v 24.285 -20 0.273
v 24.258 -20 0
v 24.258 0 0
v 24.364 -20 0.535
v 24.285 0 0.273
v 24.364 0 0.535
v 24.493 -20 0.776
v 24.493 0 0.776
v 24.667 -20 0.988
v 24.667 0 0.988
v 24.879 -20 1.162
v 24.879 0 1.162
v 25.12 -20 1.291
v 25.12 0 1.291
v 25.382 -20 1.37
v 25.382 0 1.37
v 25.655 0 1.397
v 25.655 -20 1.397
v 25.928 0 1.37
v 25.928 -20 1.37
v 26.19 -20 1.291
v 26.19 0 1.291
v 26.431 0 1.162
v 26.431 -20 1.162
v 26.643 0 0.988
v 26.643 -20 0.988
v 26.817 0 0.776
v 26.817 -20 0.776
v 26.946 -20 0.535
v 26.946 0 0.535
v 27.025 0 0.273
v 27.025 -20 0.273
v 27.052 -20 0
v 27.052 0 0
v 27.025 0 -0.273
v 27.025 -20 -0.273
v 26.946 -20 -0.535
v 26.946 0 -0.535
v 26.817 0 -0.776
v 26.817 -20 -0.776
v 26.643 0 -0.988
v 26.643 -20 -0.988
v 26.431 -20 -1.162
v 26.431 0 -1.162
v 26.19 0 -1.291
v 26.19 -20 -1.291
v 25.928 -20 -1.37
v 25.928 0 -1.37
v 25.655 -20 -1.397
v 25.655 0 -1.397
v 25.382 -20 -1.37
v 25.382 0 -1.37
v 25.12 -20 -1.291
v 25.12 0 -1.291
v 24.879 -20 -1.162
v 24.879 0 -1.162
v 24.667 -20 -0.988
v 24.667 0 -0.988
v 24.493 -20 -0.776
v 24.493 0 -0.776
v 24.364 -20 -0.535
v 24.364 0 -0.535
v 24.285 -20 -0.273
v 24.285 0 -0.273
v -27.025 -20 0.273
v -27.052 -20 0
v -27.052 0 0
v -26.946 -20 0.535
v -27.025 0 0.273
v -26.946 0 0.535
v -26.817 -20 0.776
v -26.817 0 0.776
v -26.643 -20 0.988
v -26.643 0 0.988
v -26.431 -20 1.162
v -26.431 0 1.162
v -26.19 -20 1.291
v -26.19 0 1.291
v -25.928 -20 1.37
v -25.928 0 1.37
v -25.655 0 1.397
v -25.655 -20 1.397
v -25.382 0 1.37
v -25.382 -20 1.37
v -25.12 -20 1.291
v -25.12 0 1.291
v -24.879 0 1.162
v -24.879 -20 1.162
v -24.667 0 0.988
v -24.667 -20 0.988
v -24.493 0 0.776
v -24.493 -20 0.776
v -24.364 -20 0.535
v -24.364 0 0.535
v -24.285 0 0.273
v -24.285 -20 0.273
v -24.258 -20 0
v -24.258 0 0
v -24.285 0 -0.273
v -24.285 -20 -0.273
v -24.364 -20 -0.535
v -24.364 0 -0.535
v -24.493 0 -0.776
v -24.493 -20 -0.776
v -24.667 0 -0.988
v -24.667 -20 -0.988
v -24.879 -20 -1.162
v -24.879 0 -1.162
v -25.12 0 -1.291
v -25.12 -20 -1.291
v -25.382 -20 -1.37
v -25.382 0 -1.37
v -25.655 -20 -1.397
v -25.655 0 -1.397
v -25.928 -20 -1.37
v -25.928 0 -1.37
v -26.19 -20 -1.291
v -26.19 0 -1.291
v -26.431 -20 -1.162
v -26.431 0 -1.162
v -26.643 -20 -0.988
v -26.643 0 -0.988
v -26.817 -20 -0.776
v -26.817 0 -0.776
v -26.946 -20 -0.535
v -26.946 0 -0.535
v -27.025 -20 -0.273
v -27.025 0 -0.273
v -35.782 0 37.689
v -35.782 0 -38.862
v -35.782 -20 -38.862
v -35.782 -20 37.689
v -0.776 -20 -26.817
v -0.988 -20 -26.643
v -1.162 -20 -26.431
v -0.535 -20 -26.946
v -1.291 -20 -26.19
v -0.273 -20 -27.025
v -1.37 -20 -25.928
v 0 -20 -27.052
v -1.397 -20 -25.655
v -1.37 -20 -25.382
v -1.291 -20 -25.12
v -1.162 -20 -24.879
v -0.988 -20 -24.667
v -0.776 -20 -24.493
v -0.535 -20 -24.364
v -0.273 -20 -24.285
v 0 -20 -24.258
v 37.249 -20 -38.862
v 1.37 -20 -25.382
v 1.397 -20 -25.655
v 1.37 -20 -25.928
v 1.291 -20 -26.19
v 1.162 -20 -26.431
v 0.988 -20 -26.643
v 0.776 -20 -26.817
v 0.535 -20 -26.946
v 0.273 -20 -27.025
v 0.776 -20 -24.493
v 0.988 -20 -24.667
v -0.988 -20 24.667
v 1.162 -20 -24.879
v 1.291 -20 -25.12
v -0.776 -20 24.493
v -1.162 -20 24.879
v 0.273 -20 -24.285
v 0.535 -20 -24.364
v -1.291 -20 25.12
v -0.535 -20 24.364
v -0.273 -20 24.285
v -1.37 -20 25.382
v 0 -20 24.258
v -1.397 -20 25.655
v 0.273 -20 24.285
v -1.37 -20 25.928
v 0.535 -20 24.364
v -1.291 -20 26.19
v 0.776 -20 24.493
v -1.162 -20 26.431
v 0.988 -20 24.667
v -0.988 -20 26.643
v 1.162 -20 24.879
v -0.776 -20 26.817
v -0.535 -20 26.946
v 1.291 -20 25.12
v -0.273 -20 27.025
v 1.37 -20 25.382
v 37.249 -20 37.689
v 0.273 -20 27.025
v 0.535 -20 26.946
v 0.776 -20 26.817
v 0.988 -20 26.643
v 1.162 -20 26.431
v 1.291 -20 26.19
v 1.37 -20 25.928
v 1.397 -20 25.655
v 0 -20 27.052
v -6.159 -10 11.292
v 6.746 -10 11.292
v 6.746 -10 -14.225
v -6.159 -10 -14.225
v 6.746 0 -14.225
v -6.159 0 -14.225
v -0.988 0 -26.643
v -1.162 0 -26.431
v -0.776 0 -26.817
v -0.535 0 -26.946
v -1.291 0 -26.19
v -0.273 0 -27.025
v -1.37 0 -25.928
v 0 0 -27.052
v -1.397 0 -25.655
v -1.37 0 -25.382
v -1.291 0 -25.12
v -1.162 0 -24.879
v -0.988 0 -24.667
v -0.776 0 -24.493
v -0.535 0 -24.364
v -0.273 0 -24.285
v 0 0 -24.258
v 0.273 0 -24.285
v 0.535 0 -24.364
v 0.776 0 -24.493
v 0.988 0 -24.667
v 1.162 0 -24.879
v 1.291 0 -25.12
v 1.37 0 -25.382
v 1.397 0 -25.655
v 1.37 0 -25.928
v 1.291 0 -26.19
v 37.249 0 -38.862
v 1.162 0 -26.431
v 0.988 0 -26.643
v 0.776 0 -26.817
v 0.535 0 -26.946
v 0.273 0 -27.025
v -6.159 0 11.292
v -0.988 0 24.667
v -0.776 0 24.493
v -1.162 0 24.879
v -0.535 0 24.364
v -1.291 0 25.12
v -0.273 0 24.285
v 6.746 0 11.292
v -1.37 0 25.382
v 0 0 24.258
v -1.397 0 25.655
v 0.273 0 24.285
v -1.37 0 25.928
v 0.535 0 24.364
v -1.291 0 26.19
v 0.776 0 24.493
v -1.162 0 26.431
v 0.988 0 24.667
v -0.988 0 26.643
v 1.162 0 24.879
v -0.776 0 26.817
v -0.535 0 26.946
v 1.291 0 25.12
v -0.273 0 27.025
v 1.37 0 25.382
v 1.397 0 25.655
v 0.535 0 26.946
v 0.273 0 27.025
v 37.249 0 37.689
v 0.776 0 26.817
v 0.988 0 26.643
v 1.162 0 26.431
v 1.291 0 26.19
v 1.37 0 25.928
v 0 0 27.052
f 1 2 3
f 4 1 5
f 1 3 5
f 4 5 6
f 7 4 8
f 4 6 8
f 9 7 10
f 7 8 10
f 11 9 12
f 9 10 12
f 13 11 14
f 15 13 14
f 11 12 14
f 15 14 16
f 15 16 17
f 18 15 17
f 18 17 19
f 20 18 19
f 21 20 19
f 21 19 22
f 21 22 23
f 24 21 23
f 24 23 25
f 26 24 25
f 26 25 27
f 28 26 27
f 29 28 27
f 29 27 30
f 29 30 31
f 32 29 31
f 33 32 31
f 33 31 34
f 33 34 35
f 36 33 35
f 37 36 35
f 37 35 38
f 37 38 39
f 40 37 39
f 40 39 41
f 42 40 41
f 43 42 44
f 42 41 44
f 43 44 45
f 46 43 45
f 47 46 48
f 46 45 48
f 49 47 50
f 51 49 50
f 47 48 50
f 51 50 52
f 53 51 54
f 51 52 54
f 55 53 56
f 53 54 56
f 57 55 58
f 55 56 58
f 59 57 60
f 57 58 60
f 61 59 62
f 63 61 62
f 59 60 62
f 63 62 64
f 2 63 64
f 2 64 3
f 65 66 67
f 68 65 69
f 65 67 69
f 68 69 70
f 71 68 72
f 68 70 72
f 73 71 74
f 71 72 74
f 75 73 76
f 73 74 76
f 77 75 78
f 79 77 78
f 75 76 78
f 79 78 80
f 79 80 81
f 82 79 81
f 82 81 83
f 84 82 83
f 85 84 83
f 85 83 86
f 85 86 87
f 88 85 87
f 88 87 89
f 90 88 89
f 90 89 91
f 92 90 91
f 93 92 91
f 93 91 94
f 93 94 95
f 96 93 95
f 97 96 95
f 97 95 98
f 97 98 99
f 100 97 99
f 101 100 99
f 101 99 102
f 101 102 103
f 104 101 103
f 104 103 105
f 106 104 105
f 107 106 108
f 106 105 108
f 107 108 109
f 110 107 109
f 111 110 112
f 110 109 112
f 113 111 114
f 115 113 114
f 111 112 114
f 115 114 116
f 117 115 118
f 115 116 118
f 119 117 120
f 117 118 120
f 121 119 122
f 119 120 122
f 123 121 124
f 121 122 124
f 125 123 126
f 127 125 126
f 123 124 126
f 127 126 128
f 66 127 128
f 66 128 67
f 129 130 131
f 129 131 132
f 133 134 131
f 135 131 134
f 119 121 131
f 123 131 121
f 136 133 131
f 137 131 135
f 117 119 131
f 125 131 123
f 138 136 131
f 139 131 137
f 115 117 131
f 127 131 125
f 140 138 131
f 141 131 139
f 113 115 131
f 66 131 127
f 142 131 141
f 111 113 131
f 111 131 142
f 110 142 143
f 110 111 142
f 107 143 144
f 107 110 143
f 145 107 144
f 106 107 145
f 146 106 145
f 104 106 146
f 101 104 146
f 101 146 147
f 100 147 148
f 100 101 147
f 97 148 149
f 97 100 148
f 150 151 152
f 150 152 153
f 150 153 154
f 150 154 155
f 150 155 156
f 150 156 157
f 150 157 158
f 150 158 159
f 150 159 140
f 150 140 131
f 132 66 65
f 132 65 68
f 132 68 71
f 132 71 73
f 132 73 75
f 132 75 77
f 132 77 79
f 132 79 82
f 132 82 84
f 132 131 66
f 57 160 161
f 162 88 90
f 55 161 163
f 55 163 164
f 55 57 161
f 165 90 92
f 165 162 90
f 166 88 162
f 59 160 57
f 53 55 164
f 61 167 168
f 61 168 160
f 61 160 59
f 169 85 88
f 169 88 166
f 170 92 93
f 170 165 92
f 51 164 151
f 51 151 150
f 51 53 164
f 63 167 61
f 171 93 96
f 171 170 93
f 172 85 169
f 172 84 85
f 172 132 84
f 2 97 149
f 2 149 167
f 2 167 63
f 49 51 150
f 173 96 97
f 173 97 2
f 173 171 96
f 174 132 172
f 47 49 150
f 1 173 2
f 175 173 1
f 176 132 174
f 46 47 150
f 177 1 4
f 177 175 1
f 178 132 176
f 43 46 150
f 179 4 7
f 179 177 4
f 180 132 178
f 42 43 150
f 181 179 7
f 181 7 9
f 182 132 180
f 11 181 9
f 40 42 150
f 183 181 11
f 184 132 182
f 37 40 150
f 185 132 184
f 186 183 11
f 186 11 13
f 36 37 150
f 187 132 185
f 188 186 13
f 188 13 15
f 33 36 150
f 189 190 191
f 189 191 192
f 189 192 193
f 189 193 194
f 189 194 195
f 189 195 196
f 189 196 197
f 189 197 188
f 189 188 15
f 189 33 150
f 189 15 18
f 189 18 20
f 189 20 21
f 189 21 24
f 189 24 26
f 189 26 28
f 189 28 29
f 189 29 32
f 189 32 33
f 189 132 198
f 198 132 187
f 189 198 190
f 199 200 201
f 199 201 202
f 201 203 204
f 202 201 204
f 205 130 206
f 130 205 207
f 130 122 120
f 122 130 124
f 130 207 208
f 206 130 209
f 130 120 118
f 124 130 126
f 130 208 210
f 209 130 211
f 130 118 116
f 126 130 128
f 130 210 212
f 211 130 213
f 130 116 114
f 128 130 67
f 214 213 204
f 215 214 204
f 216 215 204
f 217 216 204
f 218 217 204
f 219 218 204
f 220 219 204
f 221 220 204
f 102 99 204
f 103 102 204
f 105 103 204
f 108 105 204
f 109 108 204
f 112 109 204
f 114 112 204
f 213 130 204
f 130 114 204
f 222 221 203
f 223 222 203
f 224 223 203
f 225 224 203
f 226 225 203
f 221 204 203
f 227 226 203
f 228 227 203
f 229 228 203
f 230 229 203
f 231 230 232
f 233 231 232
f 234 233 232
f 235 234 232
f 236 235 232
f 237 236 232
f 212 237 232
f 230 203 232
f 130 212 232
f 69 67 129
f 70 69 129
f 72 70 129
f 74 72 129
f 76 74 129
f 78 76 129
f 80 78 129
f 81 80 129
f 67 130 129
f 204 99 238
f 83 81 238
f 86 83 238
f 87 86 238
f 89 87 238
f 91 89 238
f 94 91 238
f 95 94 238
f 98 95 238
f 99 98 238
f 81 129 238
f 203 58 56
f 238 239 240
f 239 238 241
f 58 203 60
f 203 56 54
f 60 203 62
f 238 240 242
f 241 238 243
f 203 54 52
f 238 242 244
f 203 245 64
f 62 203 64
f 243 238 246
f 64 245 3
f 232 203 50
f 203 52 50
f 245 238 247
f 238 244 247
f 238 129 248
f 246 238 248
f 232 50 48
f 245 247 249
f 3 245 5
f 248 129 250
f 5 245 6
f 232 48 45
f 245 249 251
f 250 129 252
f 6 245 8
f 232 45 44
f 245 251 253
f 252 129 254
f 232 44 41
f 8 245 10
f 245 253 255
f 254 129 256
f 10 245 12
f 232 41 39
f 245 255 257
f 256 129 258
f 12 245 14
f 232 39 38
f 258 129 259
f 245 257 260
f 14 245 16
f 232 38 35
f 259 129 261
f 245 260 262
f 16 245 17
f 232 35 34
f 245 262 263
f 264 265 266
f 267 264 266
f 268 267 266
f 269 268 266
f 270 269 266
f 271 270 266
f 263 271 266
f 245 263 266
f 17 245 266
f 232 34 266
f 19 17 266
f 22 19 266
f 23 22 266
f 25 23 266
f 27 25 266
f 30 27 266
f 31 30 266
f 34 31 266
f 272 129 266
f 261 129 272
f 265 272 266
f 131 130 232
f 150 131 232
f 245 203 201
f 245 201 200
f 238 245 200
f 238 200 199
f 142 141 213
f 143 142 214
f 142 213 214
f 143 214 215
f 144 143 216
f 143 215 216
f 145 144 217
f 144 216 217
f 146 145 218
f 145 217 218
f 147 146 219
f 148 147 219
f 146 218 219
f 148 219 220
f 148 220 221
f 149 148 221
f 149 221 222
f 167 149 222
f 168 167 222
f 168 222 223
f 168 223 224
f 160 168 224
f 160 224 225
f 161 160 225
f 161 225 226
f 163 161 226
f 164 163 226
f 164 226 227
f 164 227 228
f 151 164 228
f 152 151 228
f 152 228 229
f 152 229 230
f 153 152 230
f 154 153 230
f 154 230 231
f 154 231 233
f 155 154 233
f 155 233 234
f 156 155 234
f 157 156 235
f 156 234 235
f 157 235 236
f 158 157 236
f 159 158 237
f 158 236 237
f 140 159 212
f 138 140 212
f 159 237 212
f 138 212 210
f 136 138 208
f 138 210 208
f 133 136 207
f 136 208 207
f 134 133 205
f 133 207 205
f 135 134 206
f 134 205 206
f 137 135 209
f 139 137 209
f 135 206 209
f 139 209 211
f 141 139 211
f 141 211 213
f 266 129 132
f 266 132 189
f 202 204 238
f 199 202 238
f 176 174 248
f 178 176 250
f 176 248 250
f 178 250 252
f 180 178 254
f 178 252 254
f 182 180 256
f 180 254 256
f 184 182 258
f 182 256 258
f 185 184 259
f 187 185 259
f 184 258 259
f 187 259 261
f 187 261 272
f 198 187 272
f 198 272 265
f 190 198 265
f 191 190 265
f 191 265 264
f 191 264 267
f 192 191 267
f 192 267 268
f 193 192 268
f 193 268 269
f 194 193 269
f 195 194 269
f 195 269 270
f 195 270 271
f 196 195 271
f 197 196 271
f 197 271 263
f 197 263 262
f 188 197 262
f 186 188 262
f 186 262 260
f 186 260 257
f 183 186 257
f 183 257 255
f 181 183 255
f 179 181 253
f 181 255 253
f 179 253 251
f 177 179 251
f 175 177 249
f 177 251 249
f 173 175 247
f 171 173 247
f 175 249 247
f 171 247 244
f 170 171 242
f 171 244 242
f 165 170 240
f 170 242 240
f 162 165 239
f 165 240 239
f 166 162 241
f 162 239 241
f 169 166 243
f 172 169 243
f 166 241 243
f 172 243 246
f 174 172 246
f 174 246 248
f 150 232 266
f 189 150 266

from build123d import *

# Parameters (mm, degrees)
F0_W     = 73.0307288468
F0_H     = 76.5502825379
F1_DEPTH = 20
F2_W     = 12.9050291143
F2_H     = 25.5167605355
F3_DEPTH = 10
F5_D     = 2.794


with BuildPart() as f1:
    # F0 (on Front) → F1 (new body)
    with BuildSketch(Plane.XZ):
        with Locations((0.7332395762, -0.586591661)):
            Rectangle(F0_W, F0_H)
    extrude(amount=F1_DEPTH)

    # F2 (on face) → F3 (cut)
    with BuildSketch(Plane(origin=(0, 0, 0), x_dir=(-1, 0, 0), z_dir=(0, 1, 0))):
        with Locations((-0.2932955977, -1.4664805494)):
            Rectangle(F2_W, F2_H)
    extrude(amount=-F3_DEPTH, mode=Mode.SUBTRACT)

    # F5 (through all)
    with Locations(Plane.XZ.offset(20)):
        with Locations((0, 25.6550256172), (-25.6550256172, 0), (0, -25.6550256172), (25.6550256172, 0)):
            Hole(F5_D / 2)


solid = f1.part
